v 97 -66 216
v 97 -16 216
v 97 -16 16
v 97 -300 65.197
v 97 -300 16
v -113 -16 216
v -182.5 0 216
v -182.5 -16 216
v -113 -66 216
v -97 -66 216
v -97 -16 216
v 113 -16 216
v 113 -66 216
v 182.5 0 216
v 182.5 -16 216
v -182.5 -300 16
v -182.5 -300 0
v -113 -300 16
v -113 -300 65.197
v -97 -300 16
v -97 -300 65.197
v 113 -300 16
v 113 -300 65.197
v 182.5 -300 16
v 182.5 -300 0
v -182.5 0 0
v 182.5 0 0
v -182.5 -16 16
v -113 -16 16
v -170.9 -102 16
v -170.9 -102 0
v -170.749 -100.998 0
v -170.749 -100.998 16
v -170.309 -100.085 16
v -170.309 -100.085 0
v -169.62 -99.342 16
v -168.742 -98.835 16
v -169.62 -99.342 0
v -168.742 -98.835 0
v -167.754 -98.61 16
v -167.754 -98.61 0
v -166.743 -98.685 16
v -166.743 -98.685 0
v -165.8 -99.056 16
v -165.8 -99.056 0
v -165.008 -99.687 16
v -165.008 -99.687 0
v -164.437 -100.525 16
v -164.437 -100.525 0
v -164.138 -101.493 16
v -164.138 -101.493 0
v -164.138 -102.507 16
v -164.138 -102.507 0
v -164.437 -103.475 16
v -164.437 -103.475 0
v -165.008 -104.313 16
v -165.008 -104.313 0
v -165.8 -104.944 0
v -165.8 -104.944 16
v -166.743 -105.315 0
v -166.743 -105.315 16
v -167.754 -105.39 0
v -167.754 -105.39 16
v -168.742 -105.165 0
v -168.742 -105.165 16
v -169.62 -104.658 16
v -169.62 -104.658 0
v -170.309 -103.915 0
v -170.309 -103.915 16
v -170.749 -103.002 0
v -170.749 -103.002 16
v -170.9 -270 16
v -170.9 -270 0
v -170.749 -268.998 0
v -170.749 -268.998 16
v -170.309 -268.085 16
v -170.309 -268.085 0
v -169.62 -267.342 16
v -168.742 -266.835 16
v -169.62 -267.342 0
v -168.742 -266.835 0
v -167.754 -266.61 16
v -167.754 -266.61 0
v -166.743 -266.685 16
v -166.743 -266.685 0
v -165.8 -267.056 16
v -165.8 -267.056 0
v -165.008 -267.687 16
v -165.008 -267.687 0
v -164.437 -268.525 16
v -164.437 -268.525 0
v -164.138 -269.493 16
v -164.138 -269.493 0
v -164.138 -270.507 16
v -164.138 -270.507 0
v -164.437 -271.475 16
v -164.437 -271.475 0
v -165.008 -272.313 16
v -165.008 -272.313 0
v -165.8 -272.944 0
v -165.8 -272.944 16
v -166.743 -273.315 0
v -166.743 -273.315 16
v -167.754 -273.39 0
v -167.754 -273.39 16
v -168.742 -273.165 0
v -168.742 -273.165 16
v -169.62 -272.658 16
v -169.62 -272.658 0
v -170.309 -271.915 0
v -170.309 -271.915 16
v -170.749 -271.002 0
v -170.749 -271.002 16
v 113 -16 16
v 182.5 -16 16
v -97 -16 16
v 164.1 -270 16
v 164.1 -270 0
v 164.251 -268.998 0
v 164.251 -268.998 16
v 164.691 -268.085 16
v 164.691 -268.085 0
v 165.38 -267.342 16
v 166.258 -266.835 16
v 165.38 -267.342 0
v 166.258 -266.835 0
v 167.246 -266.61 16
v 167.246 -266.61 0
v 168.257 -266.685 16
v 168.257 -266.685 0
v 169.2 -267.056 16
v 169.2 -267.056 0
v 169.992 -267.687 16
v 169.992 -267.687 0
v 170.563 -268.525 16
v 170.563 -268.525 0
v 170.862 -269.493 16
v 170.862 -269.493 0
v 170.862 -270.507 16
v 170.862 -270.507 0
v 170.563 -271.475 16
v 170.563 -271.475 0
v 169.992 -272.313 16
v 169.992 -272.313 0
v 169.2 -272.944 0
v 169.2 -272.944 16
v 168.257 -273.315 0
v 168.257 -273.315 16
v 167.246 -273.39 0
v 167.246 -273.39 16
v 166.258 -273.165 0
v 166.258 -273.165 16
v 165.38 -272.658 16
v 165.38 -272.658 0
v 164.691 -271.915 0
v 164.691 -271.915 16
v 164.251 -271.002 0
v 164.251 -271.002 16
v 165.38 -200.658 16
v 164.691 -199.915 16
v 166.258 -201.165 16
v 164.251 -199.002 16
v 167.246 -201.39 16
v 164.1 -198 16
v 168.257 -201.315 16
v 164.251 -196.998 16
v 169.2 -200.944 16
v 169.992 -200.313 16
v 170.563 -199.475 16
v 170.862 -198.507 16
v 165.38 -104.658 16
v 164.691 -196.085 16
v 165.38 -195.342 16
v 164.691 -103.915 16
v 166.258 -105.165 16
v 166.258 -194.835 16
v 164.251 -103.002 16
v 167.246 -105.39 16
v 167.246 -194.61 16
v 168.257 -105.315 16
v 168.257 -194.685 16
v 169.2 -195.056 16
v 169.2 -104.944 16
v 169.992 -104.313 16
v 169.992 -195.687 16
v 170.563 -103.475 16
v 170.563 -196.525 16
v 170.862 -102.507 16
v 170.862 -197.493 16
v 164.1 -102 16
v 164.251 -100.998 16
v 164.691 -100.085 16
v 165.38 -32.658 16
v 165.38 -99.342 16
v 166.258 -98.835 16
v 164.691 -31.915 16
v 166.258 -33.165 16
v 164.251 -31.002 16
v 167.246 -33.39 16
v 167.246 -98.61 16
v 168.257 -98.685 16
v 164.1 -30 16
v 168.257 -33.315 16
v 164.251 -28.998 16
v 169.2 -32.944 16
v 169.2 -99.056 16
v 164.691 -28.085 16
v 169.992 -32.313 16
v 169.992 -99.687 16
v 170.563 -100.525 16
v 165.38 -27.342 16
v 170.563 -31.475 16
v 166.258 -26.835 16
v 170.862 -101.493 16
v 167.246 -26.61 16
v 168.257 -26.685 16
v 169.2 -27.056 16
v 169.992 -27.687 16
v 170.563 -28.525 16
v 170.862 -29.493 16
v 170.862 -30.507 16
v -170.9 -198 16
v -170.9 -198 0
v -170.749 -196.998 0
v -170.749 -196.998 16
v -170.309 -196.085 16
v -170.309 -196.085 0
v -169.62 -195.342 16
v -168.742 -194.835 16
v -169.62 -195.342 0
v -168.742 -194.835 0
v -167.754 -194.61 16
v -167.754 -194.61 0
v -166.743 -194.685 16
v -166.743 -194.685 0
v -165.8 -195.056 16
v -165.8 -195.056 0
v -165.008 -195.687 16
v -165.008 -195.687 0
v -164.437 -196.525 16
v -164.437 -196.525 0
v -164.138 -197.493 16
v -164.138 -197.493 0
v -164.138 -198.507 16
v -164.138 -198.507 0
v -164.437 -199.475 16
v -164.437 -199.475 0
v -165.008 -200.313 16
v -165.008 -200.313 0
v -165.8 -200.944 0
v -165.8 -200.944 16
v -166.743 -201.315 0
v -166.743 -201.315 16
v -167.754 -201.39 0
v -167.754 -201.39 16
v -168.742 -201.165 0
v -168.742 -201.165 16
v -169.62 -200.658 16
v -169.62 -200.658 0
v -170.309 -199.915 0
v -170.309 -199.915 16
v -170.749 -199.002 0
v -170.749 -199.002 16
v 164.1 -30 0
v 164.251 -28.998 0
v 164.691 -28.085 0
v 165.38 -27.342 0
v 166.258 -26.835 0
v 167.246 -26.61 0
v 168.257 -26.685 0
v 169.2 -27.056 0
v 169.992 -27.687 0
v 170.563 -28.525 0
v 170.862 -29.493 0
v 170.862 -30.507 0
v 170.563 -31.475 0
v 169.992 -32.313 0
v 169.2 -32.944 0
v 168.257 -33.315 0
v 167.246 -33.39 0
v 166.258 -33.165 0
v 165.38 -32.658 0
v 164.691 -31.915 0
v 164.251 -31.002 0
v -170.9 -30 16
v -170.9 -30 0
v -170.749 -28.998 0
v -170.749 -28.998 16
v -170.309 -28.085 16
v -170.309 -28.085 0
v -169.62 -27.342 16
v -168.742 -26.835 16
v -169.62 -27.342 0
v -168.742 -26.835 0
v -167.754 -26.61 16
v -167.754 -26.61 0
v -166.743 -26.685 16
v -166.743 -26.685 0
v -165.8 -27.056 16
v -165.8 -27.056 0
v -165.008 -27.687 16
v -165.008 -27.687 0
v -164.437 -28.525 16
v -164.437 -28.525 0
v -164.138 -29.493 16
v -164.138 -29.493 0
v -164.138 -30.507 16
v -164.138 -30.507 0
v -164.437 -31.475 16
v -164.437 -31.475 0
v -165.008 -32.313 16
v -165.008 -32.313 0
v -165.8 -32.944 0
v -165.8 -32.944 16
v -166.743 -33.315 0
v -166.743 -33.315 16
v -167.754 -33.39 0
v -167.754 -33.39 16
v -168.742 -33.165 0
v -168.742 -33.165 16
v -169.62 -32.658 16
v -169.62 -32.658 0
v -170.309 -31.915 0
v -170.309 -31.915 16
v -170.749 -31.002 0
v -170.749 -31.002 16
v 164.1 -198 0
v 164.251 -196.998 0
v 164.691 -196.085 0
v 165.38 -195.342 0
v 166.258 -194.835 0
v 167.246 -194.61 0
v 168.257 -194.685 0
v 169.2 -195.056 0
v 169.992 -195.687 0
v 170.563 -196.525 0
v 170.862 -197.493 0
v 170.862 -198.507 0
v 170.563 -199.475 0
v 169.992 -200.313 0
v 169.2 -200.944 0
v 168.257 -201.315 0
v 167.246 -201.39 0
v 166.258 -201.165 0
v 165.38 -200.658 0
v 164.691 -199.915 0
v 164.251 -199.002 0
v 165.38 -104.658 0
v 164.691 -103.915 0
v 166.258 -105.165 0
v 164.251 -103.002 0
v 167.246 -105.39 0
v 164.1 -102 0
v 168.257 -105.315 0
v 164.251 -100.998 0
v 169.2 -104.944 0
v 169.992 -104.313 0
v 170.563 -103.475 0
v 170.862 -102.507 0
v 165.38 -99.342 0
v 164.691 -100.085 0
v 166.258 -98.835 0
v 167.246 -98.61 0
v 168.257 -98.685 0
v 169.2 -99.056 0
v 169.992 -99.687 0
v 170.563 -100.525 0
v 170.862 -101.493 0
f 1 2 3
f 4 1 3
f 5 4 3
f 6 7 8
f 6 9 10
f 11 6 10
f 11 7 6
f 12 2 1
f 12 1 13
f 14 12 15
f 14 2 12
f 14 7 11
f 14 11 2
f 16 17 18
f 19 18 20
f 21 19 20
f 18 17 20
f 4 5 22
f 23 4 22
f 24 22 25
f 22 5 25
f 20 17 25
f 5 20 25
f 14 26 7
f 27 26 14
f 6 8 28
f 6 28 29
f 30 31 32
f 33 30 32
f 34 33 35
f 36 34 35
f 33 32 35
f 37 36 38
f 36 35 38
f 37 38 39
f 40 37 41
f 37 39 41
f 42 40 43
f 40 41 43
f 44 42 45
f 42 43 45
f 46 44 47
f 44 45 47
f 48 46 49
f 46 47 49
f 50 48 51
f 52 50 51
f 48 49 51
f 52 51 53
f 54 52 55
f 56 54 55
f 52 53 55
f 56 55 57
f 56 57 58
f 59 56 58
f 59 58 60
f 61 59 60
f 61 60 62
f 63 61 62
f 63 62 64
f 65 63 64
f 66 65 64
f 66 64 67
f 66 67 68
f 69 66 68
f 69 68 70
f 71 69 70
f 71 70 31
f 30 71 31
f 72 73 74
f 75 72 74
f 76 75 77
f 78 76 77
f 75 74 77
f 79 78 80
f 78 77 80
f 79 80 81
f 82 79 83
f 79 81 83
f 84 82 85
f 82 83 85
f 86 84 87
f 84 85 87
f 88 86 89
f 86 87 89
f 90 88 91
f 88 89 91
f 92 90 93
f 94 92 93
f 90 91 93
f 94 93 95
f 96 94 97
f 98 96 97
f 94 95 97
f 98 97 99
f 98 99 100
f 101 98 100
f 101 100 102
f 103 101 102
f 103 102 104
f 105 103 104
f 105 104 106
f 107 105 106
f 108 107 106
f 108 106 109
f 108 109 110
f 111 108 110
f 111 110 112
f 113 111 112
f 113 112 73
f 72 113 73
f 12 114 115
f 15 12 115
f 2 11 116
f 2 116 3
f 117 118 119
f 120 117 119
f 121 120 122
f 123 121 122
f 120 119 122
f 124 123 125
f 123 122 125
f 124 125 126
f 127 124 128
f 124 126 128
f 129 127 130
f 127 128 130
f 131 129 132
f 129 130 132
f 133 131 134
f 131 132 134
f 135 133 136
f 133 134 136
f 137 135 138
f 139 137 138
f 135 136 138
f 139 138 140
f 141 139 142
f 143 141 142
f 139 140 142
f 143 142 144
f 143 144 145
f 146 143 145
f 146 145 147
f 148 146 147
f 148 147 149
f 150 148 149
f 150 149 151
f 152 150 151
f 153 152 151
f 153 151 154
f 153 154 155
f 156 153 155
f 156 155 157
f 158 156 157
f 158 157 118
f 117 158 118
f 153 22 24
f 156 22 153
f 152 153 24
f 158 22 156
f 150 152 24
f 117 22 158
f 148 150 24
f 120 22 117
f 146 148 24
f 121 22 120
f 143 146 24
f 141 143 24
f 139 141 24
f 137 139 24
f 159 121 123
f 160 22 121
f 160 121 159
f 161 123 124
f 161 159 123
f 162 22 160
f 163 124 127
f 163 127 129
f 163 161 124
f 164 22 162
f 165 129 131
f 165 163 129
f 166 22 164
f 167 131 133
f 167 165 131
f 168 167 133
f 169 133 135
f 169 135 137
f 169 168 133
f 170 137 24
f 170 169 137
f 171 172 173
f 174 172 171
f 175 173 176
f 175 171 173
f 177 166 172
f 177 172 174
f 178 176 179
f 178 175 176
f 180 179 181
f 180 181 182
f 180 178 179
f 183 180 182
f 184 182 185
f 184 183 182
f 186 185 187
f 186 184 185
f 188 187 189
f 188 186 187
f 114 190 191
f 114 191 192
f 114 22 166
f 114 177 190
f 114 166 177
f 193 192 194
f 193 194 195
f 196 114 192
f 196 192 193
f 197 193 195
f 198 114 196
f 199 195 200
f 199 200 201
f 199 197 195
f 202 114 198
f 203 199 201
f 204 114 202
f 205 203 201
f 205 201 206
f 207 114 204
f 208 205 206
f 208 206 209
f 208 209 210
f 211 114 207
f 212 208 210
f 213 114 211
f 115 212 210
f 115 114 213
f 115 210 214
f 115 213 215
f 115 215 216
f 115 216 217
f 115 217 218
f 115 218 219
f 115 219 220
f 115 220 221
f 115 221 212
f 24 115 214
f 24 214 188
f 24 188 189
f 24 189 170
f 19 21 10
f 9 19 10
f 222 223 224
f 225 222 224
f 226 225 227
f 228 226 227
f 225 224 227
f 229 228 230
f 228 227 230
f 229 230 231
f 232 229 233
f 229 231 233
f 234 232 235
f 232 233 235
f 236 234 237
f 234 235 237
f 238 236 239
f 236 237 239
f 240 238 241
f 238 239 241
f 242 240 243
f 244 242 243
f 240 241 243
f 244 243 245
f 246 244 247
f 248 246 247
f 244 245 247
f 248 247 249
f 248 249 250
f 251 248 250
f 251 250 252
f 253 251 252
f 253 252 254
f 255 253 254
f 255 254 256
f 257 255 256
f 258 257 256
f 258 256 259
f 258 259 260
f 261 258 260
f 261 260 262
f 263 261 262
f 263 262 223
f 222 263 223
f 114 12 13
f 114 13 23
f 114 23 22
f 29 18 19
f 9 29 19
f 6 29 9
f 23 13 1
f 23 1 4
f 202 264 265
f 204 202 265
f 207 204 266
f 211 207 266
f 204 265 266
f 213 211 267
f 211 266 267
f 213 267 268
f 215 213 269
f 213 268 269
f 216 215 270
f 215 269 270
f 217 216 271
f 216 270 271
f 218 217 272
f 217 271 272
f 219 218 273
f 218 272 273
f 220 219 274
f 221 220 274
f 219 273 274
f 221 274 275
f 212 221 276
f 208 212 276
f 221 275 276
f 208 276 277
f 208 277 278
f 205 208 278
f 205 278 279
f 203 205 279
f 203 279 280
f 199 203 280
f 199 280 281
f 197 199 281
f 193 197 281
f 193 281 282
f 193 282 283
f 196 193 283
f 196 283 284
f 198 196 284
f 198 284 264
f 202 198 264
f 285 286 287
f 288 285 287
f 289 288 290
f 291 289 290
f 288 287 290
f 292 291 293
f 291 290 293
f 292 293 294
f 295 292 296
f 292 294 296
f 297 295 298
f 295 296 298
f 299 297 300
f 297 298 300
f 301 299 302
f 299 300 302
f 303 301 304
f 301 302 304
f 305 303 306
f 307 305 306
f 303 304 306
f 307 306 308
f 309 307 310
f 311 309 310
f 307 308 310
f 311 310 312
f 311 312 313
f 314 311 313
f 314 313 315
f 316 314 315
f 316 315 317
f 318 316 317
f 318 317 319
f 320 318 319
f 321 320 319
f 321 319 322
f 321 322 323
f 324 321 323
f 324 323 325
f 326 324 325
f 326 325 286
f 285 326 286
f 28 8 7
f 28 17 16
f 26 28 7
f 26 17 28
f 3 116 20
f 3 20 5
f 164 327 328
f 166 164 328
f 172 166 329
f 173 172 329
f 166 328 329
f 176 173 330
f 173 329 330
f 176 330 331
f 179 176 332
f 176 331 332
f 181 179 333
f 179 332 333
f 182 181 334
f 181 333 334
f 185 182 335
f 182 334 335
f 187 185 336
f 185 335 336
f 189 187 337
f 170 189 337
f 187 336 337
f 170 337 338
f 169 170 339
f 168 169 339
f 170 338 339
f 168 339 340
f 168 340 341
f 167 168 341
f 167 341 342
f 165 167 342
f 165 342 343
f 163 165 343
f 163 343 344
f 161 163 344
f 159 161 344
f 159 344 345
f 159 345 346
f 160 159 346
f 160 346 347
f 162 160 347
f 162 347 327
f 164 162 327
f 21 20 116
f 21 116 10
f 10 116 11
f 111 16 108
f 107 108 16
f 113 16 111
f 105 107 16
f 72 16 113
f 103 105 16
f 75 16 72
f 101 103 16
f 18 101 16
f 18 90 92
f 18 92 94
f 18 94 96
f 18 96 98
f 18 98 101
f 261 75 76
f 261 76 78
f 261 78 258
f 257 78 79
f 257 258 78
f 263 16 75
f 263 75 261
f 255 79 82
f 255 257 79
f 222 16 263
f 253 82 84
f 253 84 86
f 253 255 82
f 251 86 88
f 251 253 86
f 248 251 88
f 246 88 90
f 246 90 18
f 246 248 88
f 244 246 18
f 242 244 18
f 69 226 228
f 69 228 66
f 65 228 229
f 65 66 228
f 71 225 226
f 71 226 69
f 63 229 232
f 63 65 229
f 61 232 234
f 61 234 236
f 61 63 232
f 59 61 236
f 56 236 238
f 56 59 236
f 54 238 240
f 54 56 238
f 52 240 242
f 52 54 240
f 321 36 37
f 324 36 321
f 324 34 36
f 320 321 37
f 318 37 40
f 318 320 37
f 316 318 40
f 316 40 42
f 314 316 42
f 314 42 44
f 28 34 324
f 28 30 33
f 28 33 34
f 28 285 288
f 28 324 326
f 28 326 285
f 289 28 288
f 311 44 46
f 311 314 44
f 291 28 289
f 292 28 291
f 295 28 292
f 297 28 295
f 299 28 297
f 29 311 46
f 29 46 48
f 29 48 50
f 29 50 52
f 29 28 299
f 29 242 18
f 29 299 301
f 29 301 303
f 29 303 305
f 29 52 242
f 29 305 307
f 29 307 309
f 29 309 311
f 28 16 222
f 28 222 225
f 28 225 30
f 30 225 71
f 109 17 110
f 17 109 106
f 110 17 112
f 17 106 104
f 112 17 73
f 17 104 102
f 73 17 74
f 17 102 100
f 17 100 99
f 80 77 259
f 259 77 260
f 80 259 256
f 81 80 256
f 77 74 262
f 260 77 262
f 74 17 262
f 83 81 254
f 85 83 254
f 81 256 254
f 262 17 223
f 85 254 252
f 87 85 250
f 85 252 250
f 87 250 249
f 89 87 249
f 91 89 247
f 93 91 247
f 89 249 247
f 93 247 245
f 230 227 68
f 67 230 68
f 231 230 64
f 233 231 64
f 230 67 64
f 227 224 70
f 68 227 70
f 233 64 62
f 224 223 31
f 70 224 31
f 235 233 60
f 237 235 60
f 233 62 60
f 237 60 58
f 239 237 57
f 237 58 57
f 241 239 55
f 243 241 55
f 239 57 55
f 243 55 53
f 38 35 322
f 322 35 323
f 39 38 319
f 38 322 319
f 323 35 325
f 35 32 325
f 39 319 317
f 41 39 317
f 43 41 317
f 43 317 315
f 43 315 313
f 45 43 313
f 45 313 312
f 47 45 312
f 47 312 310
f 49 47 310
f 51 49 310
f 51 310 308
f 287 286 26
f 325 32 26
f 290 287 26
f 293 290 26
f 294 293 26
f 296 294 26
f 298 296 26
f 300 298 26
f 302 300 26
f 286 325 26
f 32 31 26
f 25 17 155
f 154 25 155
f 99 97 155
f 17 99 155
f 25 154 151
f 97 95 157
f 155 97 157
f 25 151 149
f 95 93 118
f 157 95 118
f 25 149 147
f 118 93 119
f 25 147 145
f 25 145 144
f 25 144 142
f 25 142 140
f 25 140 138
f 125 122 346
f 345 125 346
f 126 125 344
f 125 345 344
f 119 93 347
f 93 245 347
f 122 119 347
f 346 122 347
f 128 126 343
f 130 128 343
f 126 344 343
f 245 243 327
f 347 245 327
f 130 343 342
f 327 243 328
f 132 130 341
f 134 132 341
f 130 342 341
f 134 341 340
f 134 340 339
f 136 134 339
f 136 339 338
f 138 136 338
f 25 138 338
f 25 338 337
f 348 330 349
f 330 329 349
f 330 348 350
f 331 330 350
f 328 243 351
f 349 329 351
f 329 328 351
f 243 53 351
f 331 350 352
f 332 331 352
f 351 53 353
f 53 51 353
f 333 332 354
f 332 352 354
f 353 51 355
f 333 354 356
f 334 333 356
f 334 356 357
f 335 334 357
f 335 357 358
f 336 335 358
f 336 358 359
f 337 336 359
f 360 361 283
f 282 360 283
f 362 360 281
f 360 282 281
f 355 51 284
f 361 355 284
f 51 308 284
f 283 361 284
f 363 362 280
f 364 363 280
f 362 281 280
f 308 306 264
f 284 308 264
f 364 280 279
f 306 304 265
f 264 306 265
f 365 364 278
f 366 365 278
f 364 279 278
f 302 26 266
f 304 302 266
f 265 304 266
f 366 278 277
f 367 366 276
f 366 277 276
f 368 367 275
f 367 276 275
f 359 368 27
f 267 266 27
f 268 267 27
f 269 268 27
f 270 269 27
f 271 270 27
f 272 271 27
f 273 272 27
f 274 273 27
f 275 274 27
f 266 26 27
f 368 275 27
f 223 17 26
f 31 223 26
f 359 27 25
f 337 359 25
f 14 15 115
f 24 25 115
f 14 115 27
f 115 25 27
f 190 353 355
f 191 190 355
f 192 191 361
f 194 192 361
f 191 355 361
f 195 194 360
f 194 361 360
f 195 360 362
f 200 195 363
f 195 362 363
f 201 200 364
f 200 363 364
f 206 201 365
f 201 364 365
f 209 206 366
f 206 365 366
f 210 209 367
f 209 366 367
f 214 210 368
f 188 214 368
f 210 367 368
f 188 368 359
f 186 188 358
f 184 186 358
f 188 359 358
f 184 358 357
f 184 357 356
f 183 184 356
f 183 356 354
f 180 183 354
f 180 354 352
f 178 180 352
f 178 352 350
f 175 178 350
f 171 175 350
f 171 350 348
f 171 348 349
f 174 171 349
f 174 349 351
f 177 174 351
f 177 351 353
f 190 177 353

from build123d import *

# Parameters (mm, degrees)
SKETCH1_W              = 365
SKETCH1_H              = 300
BOSS_EXTRUDE1_DEPTH    = 16
SKETCH2_W              = 365
SKETCH2_H              = 16
BOSS_EXTRUDE2_DEPTH    = 200
BOSS_EXTRUDE3_START    = -69.5
BOSS_EXTRUDE3_DEPTH    = 16
BOSS_EXTRUDE4_START    = 194
BOSS_EXTRUDE4_DEPTH    = 16
M8X1_25_TAPPED_HOLE1_D = 6.8
LPATTERN1_COUNT        = 2
LPATTERN1_PITCH        = 335


with BuildPart() as part:
    # Sketch1 → Boss-Extrude1 (new body)
    with BuildSketch(Plane.XY):
        with Locations((0, -150)):
            Rectangle(SKETCH1_W, SKETCH1_H)
    extrude(amount=BOSS_EXTRUDE1_DEPTH)

    # Sketch2 → Boss-Extrude2 (add)
    with BuildSketch(Plane.XY.offset(16)):
        with Locations((0, -8)):
            Rectangle(SKETCH2_W, SKETCH2_H)
    extrude(amount=BOSS_EXTRUDE2_DEPTH)

    # Sketch3 → Boss-Extrude3 (add)
    with BuildSketch(Plane(origin=(182.5, 0, 0), x_dir=(0, 0, -1), z_dir=(1, 0, 0)).offset(BOSS_EXTRUDE3_START)):
        Polygon((-216, -16), (-216, -66), (-65.197290638, -300), (-16, -300), (-16, -16), align=None)
    extrude(amount=-BOSS_EXTRUDE3_DEPTH)

    # Sketch4 → Boss-Extrude4 (add)
    with BuildSketch(Plane.ZY.offset(-97).offset(BOSS_EXTRUDE4_START)):
        Polygon((216, -16), (16, -16), (16, -300), (65.197290638, -300), (216, -66), align=None)
    extrude(amount=BOSS_EXTRUDE4_DEPTH)

    # M8x1.25 Tapped Hole1 (through all)
    with Locations(Plane.XY.offset(16)):
        with Locations((167.5, -30), (167.5, -270), (167.5, -198), (167.5, -102)):
            m8x1_25_tapped_hole1 = Hole(M8X1_25_TAPPED_HOLE1_D / 2)

    # LPattern1: M8x1.25 Tapped Hole1 ×2
    with Locations(*[(-i * LPATTERN1_PITCH, 0, 0) for i in range(1, LPATTERN1_COUNT)]):
        add(m8x1_25_tapped_hole1, mode=Mode.SUBTRACT)


solid = part.part
